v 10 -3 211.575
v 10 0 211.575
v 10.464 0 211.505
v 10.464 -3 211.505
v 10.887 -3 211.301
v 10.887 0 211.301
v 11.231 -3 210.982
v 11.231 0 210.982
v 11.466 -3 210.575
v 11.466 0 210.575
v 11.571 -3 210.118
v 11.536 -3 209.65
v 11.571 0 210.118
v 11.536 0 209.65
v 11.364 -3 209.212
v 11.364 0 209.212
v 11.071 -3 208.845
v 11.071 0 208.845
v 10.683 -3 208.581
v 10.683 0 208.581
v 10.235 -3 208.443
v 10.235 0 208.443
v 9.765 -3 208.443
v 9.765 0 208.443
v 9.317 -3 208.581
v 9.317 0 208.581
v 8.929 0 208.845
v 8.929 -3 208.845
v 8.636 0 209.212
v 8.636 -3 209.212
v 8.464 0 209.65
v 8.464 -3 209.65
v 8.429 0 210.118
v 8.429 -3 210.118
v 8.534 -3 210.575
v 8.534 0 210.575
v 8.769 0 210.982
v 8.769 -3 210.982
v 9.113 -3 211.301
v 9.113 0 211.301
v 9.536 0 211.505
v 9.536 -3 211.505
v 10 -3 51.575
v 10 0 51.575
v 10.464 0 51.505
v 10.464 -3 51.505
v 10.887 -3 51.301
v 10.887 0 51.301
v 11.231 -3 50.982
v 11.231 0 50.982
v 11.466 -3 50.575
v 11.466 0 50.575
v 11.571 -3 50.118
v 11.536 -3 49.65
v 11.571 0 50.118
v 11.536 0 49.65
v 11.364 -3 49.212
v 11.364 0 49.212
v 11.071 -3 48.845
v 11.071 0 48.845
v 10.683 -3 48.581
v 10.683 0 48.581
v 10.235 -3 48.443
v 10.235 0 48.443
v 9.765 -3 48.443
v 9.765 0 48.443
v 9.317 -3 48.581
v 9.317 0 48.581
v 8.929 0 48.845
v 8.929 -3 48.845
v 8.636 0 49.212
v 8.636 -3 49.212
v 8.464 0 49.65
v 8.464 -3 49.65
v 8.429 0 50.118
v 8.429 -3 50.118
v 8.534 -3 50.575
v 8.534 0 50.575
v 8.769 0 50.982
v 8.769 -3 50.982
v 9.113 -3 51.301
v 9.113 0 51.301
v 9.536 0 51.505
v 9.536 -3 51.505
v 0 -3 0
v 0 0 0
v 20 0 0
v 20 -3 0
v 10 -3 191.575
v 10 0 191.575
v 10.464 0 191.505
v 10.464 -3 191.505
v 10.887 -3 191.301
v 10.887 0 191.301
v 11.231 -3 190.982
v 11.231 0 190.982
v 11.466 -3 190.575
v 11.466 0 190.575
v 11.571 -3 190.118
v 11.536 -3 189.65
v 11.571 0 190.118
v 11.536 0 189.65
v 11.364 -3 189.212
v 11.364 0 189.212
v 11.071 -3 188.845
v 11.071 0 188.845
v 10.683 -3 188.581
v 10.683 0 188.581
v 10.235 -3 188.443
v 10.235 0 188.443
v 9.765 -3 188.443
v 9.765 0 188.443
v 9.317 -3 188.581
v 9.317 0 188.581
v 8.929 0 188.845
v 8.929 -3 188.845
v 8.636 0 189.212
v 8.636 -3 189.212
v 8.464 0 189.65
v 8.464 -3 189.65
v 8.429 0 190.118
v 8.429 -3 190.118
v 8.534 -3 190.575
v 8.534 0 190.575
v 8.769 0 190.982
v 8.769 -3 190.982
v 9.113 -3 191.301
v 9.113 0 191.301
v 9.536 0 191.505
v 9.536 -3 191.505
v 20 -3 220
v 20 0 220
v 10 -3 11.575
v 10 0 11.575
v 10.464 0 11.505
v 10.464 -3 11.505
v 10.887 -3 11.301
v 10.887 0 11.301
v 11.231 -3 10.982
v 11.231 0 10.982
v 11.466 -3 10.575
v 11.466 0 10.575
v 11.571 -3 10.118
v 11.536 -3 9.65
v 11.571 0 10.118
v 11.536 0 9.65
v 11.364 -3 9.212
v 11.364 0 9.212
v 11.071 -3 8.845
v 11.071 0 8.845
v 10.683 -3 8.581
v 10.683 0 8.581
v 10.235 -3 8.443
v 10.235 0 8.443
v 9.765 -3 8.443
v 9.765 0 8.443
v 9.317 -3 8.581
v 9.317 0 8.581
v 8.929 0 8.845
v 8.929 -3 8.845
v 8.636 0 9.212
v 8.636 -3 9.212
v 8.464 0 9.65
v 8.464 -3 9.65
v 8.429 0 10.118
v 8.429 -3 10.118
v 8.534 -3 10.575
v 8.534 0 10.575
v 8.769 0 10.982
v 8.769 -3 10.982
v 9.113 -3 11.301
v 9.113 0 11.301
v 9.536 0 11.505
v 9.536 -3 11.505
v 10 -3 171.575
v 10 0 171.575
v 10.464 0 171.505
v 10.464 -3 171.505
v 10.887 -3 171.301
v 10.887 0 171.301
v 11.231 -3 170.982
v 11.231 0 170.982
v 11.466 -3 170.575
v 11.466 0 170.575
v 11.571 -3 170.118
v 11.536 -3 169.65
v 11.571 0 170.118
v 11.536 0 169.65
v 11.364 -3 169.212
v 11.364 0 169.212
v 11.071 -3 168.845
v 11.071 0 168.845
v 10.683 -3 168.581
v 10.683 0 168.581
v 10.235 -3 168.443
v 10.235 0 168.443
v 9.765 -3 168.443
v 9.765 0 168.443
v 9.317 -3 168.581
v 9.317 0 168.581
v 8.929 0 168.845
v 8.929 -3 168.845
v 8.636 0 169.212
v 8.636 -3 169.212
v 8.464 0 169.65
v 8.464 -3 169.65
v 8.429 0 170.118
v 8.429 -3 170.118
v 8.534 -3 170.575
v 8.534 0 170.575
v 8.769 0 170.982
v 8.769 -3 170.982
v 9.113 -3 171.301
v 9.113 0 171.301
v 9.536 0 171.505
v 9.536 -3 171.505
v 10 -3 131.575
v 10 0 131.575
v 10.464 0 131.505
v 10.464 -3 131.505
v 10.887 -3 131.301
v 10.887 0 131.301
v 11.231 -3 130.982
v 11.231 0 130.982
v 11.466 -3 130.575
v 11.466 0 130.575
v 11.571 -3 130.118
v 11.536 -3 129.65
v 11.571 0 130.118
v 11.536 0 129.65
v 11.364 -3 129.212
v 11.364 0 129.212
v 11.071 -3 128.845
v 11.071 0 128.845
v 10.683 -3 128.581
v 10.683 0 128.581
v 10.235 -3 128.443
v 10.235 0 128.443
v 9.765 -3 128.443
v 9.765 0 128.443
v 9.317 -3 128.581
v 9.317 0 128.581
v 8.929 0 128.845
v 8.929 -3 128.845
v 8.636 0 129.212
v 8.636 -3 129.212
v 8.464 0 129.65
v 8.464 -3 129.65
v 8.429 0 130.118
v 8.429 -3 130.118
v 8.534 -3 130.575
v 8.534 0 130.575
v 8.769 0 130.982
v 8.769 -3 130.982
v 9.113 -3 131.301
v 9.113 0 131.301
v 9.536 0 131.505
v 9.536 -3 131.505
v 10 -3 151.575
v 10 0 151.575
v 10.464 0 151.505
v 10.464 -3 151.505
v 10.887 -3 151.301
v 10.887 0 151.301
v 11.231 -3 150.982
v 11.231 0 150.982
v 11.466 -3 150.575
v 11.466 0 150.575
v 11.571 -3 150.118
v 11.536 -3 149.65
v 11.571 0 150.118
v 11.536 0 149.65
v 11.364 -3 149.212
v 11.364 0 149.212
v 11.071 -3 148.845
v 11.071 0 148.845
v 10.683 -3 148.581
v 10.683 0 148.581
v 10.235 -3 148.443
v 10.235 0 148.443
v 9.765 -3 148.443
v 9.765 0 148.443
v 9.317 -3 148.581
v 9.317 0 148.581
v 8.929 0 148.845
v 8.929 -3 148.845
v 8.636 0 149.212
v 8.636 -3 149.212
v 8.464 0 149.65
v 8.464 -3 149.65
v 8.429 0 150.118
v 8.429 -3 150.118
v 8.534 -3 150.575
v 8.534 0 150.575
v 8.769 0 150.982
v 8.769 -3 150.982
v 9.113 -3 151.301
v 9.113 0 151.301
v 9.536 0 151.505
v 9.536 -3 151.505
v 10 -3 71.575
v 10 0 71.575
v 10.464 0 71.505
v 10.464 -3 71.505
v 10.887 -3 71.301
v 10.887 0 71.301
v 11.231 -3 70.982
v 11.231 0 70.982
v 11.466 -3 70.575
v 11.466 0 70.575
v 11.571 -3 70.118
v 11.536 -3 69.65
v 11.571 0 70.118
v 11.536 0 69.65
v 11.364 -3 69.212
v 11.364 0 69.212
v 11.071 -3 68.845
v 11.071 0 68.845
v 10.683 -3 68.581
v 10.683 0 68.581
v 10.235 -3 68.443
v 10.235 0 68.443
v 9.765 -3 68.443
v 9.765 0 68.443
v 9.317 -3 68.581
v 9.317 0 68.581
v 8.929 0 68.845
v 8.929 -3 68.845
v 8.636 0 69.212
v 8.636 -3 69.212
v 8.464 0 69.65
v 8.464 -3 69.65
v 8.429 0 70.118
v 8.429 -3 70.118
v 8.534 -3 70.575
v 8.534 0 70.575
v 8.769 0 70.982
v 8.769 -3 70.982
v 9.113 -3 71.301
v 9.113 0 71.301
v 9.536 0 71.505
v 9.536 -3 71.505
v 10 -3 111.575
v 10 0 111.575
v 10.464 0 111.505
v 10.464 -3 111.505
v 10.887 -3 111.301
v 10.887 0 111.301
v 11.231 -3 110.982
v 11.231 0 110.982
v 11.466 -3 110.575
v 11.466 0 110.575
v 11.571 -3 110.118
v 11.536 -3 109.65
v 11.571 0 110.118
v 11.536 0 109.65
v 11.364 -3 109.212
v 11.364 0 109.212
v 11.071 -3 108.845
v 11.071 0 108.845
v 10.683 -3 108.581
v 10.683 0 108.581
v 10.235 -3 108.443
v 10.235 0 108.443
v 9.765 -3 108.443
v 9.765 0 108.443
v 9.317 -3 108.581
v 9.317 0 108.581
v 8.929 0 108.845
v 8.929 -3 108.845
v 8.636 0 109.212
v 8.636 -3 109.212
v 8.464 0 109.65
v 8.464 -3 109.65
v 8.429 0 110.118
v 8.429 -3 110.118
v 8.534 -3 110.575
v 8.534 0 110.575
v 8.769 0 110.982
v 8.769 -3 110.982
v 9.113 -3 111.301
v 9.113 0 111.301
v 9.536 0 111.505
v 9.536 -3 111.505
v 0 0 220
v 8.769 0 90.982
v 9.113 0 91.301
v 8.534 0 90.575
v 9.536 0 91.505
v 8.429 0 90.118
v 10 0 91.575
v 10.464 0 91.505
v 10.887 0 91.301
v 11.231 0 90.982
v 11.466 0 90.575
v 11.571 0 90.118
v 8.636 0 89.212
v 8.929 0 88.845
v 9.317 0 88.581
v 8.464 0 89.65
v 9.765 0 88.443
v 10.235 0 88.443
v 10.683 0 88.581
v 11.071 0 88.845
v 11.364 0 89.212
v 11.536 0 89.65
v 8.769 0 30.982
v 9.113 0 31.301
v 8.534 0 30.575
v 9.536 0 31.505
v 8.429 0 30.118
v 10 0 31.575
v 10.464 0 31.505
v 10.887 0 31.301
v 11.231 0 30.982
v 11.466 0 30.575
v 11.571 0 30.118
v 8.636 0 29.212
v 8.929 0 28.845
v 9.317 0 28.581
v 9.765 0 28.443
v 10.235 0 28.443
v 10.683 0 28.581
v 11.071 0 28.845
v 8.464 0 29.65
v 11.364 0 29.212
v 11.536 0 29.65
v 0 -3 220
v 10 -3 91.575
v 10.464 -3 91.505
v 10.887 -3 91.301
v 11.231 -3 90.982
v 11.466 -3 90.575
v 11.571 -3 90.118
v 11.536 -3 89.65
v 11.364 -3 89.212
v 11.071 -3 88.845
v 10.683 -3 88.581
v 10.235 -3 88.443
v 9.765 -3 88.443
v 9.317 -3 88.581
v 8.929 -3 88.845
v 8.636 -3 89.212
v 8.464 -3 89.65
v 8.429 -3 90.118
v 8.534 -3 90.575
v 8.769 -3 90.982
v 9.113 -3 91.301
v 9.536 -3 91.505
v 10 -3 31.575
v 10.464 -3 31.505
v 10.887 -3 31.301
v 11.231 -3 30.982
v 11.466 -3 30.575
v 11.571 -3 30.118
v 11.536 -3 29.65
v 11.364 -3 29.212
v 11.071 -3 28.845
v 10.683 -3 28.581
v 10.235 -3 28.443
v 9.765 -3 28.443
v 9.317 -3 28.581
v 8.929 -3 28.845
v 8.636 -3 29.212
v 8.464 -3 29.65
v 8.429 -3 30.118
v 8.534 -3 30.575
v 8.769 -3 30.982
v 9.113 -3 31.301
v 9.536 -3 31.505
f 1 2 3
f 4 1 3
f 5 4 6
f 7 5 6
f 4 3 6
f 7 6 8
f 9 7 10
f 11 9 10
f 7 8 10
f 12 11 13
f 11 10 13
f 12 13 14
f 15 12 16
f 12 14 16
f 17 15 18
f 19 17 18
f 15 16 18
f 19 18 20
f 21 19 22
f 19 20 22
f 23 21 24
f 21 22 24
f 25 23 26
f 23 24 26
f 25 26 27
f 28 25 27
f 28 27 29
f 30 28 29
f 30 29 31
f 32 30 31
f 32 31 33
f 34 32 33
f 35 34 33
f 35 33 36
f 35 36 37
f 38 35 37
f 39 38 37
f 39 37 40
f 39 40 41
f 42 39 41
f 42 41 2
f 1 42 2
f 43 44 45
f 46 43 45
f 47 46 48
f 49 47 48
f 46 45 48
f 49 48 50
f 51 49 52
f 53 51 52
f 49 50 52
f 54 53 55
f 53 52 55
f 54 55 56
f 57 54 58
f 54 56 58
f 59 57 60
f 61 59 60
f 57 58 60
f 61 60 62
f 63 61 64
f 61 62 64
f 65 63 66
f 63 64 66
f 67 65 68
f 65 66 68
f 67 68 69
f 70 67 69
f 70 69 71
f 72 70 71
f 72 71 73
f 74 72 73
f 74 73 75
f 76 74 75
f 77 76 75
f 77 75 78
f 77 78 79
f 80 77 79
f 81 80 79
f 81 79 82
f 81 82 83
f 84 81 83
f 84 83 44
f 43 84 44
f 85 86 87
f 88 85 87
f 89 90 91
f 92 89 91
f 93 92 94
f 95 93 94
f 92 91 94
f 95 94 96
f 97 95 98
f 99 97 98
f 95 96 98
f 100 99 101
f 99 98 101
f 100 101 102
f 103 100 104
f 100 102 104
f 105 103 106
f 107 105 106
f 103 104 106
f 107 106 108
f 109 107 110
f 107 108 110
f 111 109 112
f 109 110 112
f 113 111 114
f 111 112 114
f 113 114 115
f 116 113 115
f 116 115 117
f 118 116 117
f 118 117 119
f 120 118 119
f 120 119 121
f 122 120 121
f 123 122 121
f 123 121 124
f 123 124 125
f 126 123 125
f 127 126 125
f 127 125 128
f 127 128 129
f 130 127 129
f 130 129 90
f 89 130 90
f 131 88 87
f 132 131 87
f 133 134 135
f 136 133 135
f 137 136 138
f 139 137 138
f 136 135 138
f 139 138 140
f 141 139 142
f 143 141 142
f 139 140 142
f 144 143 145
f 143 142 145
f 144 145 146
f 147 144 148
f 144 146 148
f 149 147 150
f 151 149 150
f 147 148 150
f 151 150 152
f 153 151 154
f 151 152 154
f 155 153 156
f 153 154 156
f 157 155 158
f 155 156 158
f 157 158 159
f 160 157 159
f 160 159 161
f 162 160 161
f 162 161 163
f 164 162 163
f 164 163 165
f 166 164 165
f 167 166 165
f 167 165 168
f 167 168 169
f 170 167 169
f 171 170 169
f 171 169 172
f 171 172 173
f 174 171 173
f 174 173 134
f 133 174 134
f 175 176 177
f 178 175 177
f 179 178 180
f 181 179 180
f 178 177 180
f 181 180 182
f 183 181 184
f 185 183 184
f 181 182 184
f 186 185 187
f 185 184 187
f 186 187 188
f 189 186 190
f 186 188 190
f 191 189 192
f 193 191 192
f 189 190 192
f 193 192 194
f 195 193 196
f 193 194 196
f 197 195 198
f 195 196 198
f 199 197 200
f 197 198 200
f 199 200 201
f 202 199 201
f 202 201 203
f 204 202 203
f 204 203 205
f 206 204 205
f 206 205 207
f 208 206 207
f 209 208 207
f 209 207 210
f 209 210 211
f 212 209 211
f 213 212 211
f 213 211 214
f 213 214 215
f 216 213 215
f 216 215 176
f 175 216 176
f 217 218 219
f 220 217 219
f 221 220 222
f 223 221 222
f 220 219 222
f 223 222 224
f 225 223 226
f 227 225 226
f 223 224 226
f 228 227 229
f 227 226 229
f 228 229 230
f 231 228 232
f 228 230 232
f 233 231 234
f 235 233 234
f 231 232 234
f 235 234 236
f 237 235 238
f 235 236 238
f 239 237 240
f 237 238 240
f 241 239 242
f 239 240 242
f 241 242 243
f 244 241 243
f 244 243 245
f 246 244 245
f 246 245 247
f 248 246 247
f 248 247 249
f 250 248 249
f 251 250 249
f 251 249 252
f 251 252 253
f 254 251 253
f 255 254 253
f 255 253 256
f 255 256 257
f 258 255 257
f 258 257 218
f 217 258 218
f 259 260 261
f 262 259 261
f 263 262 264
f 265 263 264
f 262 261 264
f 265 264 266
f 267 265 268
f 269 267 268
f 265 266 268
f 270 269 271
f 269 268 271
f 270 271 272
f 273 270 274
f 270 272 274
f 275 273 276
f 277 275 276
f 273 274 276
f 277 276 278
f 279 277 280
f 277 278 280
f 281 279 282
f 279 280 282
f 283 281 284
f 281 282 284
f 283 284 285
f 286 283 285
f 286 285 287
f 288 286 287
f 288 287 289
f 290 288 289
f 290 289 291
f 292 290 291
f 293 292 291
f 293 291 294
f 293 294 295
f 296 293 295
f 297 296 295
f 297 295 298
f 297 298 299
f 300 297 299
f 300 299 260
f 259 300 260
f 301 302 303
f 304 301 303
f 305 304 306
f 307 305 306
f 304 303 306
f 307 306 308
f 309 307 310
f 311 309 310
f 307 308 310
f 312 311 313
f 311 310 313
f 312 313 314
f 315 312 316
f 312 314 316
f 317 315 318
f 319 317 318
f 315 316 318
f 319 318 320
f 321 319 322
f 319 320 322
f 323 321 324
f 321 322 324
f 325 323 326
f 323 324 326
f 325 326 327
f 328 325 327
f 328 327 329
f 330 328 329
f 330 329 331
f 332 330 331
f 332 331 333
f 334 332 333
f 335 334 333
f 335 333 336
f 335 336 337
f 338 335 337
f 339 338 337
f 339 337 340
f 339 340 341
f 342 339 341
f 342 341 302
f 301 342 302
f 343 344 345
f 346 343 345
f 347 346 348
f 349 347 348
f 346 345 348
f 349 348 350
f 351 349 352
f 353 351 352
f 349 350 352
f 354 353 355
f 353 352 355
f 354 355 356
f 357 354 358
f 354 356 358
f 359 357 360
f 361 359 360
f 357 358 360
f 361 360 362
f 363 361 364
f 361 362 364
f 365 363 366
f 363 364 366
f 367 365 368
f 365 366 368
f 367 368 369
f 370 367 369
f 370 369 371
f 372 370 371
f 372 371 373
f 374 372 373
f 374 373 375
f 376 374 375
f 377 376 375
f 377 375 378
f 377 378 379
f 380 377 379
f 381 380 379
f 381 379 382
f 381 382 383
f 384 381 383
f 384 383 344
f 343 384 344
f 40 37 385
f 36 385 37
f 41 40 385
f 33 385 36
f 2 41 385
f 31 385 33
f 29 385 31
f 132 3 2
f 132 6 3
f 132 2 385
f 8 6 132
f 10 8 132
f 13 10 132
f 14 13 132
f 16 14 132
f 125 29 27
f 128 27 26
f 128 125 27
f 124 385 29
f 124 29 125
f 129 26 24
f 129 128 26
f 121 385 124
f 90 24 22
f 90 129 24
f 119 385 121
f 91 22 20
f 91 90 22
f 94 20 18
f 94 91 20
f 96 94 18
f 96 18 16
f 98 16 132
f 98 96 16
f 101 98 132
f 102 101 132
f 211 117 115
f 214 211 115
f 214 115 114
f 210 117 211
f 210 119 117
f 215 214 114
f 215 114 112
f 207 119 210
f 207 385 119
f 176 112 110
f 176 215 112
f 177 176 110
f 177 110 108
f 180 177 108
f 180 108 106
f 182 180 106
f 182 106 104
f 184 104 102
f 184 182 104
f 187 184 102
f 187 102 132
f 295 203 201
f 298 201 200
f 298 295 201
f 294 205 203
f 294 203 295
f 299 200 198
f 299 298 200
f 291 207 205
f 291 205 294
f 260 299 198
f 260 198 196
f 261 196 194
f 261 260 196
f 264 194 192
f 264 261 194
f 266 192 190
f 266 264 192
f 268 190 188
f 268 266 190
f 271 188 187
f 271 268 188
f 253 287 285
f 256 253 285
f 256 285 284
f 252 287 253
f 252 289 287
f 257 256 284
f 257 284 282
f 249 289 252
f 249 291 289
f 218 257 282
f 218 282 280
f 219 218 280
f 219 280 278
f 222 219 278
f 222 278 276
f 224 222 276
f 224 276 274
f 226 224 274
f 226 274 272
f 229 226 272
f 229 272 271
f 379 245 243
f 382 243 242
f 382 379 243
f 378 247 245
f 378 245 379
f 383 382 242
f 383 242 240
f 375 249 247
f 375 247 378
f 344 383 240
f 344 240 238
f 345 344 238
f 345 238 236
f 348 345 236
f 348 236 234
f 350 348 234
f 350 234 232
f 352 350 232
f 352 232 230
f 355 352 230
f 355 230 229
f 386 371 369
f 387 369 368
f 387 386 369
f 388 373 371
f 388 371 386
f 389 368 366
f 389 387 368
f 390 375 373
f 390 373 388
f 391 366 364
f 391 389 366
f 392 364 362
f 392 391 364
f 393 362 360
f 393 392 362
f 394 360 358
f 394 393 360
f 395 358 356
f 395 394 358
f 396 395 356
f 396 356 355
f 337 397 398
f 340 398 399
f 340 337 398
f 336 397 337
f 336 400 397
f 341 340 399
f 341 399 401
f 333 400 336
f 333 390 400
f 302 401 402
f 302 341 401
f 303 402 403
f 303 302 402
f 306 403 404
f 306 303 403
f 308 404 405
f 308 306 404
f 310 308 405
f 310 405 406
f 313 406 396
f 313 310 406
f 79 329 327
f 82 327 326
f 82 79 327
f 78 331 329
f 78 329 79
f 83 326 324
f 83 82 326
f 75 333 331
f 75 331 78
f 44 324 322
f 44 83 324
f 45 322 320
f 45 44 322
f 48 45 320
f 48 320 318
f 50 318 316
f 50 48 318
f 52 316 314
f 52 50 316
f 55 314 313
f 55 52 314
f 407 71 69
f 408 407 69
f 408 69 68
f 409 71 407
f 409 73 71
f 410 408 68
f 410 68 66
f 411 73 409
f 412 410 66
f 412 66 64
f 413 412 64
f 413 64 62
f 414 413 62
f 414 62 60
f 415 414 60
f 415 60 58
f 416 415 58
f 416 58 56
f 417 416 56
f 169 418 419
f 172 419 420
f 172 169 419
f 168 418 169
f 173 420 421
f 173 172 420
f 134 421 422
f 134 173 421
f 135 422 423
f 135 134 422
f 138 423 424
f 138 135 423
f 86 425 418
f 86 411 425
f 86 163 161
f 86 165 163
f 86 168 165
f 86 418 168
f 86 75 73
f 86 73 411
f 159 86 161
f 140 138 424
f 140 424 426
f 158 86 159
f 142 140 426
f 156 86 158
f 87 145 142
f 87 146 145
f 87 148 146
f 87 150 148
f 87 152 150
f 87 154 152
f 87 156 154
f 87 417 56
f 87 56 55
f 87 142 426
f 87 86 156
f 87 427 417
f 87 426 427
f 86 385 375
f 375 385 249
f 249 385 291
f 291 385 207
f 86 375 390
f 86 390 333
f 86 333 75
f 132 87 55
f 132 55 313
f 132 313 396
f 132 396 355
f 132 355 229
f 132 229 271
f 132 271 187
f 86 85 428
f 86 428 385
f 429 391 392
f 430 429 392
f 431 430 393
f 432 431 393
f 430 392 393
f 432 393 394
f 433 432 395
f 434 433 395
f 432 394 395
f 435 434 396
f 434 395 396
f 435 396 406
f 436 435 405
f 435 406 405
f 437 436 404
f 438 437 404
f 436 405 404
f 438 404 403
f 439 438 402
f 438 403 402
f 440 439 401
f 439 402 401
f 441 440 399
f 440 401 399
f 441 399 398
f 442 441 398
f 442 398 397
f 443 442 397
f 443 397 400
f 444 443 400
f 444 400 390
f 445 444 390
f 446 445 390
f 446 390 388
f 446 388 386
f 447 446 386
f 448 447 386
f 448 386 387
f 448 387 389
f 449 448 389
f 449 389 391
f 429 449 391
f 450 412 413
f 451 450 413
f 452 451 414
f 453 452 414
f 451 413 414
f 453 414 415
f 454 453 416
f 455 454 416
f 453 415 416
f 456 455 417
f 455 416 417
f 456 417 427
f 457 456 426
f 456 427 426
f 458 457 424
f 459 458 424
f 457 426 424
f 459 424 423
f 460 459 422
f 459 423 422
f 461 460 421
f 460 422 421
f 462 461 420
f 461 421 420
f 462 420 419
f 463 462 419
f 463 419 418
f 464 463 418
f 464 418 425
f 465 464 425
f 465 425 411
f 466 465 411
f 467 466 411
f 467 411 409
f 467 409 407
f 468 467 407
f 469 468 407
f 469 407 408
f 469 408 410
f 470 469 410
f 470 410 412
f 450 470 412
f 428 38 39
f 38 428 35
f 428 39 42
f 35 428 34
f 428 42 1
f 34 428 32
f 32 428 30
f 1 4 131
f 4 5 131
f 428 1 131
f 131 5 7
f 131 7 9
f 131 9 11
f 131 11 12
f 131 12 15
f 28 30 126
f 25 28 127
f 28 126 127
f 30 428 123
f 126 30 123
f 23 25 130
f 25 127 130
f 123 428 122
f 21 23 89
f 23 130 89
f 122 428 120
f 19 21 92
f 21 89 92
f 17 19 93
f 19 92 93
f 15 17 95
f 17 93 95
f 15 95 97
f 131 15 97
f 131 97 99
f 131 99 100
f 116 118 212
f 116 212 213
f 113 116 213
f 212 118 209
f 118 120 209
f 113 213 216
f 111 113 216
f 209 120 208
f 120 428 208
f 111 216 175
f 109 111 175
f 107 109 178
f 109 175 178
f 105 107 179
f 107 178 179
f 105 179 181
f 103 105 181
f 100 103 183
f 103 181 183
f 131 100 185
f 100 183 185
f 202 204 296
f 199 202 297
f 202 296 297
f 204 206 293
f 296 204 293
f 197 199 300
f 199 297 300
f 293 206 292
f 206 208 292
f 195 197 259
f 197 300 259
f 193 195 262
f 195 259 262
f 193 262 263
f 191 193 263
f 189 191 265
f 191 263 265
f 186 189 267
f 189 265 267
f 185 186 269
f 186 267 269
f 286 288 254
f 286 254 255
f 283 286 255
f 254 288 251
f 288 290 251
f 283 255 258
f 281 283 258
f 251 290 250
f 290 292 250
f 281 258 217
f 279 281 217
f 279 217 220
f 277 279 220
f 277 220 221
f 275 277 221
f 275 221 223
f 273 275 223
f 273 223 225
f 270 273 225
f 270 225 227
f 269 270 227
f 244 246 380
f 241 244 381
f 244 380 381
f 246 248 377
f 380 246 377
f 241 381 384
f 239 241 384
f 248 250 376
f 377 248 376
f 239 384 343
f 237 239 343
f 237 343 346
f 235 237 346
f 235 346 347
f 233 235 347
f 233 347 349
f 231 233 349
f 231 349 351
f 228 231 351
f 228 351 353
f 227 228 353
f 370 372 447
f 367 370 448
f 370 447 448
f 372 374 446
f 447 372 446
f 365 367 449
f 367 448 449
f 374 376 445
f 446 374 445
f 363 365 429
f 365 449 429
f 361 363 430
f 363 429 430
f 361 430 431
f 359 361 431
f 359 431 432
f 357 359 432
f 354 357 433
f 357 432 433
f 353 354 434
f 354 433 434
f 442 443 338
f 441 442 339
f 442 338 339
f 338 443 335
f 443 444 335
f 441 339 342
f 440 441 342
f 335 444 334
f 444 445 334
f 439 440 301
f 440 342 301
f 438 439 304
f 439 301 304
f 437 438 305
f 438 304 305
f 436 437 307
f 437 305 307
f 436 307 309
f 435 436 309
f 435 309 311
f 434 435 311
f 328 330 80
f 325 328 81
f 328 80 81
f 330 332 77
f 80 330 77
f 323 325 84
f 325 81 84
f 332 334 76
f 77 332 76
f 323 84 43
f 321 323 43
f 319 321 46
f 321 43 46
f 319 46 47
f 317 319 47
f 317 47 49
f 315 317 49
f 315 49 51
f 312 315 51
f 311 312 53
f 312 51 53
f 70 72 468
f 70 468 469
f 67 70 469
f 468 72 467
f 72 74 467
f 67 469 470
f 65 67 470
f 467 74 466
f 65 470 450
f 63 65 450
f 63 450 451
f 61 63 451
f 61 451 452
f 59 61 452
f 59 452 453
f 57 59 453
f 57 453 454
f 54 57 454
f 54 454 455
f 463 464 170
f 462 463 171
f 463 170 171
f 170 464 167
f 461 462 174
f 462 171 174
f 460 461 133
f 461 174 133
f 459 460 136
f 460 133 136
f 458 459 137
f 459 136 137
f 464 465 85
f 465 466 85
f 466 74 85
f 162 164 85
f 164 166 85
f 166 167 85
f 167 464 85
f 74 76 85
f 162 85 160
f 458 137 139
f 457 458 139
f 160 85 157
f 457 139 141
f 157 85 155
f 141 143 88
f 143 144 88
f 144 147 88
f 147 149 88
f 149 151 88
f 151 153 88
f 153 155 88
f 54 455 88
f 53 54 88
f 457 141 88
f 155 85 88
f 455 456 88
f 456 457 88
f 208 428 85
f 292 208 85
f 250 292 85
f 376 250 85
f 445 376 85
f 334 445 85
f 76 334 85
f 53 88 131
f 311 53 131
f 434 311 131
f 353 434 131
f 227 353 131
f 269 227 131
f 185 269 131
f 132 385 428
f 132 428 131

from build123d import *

# Parameters (mm, degrees)
SKETCH_1_W          = 20
SKETCH_1_H          = 3
EXTRUDE_1_DEPTH     = 220
SKETCH_2_R          = 1.575
CUT_EXTRUDE_1_DEPTH = 221.927589947


with BuildPart() as part:
    # 草图1 → 凸台-拉伸1 (new body)
    with BuildSketch(Plane.XY):
        with Locations((10, -1.5)):
            Rectangle(SKETCH_1_W, SKETCH_1_H)
    extrude(amount=EXTRUDE_1_DEPTH)

    # 草图2 → 切除-拉伸1 (cut, through all)
    with BuildSketch(Plane(origin=(0, 0, 0), x_dir=(1, 0, 0), z_dir=(0, 1, 0))):
        with Locations(Location((10, -10, 0), (0, 0, 270))):
            Circle(SKETCH_2_R)
        with Locations(Location((10, -30, 0), (0, 0, 270))):
            Circle(SKETCH_2_R)
        with Locations(Location((10, -50, 0), (0, 0, 270))):
            Circle(SKETCH_2_R)
        with Locations(Location((10, -70, 0), (0, 0, 270))):
            Circle(SKETCH_2_R)
        with Locations(Location((10, -90, 0), (0, 0, 270))):
            Circle(SKETCH_2_R)
        with Locations(Location((10, -110, 0), (0, 0, 270))):
            Circle(SKETCH_2_R)
        with Locations(Location((10, -130, 0), (0, 0, 270))):
            Circle(SKETCH_2_R)
        with Locations(Location((10, -150, 0), (0, 0, 270))):
            Circle(SKETCH_2_R)
        with Locations(Location((10, -170, 0), (0, 0, 270))):
            Circle(SKETCH_2_R)
        with Locations(Location((10, -190, 0), (0, 0, 270))):
            Circle(SKETCH_2_R)
        with Locations(Location((10, -210, 0), (0, 0, 270))):
            Circle(SKETCH_2_R)
        with Locations((10, -230)):
            Circle(SKETCH_2_R)
        with Locations((10, -250)):
            Circle(SKETCH_2_R)
        with Locations((10, -270)):
            Circle(SKETCH_2_R)
        with Locations((10, -290)):
            Circle(SKETCH_2_R)
        with Locations((10, -310)):
            Circle(SKETCH_2_R)
        with Locations((10, -330)):
            Circle(SKETCH_2_R)
        with Locations((10, -350)):
            Circle(SKETCH_2_R)
        with Locations((10, -370)):
            Circle(SKETCH_2_R)
        with Locations((10, -390)):
            Circle(SKETCH_2_R)
        with Locations((10, -410)):
            Circle(SKETCH_2_R)
        with Locations((10, -430)):
            Circle(SKETCH_2_R)
        with Locations((10, -450)):
            Circle(SKETCH_2_R)
        with Locations((10, -470)):
            Circle(SKETCH_2_R)
        with Locations((10, -490)):
            Circle(SKETCH_2_R)
        with Locations((10, -510)):
            Circle(SKETCH_2_R)
        with Locations((10, -530)):
            Circle(SKETCH_2_R)
        with Locations((10, -550)):
            Circle(SKETCH_2_R)
        with Locations((10, -570)):
            Circle(SKETCH_2_R)
        with Locations((10, -590)):
            Circle(SKETCH_2_R)
        with Locations((10, -610)):
            Circle(SKETCH_2_R)
        with Locations((10, -630)):
            Circle(SKETCH_2_R)
        with Locations((10, -650)):
            Circle(SKETCH_2_R)
    extrude(amount=-CUT_EXTRUDE_1_DEPTH, mode=Mode.SUBTRACT)


solid = part.part
